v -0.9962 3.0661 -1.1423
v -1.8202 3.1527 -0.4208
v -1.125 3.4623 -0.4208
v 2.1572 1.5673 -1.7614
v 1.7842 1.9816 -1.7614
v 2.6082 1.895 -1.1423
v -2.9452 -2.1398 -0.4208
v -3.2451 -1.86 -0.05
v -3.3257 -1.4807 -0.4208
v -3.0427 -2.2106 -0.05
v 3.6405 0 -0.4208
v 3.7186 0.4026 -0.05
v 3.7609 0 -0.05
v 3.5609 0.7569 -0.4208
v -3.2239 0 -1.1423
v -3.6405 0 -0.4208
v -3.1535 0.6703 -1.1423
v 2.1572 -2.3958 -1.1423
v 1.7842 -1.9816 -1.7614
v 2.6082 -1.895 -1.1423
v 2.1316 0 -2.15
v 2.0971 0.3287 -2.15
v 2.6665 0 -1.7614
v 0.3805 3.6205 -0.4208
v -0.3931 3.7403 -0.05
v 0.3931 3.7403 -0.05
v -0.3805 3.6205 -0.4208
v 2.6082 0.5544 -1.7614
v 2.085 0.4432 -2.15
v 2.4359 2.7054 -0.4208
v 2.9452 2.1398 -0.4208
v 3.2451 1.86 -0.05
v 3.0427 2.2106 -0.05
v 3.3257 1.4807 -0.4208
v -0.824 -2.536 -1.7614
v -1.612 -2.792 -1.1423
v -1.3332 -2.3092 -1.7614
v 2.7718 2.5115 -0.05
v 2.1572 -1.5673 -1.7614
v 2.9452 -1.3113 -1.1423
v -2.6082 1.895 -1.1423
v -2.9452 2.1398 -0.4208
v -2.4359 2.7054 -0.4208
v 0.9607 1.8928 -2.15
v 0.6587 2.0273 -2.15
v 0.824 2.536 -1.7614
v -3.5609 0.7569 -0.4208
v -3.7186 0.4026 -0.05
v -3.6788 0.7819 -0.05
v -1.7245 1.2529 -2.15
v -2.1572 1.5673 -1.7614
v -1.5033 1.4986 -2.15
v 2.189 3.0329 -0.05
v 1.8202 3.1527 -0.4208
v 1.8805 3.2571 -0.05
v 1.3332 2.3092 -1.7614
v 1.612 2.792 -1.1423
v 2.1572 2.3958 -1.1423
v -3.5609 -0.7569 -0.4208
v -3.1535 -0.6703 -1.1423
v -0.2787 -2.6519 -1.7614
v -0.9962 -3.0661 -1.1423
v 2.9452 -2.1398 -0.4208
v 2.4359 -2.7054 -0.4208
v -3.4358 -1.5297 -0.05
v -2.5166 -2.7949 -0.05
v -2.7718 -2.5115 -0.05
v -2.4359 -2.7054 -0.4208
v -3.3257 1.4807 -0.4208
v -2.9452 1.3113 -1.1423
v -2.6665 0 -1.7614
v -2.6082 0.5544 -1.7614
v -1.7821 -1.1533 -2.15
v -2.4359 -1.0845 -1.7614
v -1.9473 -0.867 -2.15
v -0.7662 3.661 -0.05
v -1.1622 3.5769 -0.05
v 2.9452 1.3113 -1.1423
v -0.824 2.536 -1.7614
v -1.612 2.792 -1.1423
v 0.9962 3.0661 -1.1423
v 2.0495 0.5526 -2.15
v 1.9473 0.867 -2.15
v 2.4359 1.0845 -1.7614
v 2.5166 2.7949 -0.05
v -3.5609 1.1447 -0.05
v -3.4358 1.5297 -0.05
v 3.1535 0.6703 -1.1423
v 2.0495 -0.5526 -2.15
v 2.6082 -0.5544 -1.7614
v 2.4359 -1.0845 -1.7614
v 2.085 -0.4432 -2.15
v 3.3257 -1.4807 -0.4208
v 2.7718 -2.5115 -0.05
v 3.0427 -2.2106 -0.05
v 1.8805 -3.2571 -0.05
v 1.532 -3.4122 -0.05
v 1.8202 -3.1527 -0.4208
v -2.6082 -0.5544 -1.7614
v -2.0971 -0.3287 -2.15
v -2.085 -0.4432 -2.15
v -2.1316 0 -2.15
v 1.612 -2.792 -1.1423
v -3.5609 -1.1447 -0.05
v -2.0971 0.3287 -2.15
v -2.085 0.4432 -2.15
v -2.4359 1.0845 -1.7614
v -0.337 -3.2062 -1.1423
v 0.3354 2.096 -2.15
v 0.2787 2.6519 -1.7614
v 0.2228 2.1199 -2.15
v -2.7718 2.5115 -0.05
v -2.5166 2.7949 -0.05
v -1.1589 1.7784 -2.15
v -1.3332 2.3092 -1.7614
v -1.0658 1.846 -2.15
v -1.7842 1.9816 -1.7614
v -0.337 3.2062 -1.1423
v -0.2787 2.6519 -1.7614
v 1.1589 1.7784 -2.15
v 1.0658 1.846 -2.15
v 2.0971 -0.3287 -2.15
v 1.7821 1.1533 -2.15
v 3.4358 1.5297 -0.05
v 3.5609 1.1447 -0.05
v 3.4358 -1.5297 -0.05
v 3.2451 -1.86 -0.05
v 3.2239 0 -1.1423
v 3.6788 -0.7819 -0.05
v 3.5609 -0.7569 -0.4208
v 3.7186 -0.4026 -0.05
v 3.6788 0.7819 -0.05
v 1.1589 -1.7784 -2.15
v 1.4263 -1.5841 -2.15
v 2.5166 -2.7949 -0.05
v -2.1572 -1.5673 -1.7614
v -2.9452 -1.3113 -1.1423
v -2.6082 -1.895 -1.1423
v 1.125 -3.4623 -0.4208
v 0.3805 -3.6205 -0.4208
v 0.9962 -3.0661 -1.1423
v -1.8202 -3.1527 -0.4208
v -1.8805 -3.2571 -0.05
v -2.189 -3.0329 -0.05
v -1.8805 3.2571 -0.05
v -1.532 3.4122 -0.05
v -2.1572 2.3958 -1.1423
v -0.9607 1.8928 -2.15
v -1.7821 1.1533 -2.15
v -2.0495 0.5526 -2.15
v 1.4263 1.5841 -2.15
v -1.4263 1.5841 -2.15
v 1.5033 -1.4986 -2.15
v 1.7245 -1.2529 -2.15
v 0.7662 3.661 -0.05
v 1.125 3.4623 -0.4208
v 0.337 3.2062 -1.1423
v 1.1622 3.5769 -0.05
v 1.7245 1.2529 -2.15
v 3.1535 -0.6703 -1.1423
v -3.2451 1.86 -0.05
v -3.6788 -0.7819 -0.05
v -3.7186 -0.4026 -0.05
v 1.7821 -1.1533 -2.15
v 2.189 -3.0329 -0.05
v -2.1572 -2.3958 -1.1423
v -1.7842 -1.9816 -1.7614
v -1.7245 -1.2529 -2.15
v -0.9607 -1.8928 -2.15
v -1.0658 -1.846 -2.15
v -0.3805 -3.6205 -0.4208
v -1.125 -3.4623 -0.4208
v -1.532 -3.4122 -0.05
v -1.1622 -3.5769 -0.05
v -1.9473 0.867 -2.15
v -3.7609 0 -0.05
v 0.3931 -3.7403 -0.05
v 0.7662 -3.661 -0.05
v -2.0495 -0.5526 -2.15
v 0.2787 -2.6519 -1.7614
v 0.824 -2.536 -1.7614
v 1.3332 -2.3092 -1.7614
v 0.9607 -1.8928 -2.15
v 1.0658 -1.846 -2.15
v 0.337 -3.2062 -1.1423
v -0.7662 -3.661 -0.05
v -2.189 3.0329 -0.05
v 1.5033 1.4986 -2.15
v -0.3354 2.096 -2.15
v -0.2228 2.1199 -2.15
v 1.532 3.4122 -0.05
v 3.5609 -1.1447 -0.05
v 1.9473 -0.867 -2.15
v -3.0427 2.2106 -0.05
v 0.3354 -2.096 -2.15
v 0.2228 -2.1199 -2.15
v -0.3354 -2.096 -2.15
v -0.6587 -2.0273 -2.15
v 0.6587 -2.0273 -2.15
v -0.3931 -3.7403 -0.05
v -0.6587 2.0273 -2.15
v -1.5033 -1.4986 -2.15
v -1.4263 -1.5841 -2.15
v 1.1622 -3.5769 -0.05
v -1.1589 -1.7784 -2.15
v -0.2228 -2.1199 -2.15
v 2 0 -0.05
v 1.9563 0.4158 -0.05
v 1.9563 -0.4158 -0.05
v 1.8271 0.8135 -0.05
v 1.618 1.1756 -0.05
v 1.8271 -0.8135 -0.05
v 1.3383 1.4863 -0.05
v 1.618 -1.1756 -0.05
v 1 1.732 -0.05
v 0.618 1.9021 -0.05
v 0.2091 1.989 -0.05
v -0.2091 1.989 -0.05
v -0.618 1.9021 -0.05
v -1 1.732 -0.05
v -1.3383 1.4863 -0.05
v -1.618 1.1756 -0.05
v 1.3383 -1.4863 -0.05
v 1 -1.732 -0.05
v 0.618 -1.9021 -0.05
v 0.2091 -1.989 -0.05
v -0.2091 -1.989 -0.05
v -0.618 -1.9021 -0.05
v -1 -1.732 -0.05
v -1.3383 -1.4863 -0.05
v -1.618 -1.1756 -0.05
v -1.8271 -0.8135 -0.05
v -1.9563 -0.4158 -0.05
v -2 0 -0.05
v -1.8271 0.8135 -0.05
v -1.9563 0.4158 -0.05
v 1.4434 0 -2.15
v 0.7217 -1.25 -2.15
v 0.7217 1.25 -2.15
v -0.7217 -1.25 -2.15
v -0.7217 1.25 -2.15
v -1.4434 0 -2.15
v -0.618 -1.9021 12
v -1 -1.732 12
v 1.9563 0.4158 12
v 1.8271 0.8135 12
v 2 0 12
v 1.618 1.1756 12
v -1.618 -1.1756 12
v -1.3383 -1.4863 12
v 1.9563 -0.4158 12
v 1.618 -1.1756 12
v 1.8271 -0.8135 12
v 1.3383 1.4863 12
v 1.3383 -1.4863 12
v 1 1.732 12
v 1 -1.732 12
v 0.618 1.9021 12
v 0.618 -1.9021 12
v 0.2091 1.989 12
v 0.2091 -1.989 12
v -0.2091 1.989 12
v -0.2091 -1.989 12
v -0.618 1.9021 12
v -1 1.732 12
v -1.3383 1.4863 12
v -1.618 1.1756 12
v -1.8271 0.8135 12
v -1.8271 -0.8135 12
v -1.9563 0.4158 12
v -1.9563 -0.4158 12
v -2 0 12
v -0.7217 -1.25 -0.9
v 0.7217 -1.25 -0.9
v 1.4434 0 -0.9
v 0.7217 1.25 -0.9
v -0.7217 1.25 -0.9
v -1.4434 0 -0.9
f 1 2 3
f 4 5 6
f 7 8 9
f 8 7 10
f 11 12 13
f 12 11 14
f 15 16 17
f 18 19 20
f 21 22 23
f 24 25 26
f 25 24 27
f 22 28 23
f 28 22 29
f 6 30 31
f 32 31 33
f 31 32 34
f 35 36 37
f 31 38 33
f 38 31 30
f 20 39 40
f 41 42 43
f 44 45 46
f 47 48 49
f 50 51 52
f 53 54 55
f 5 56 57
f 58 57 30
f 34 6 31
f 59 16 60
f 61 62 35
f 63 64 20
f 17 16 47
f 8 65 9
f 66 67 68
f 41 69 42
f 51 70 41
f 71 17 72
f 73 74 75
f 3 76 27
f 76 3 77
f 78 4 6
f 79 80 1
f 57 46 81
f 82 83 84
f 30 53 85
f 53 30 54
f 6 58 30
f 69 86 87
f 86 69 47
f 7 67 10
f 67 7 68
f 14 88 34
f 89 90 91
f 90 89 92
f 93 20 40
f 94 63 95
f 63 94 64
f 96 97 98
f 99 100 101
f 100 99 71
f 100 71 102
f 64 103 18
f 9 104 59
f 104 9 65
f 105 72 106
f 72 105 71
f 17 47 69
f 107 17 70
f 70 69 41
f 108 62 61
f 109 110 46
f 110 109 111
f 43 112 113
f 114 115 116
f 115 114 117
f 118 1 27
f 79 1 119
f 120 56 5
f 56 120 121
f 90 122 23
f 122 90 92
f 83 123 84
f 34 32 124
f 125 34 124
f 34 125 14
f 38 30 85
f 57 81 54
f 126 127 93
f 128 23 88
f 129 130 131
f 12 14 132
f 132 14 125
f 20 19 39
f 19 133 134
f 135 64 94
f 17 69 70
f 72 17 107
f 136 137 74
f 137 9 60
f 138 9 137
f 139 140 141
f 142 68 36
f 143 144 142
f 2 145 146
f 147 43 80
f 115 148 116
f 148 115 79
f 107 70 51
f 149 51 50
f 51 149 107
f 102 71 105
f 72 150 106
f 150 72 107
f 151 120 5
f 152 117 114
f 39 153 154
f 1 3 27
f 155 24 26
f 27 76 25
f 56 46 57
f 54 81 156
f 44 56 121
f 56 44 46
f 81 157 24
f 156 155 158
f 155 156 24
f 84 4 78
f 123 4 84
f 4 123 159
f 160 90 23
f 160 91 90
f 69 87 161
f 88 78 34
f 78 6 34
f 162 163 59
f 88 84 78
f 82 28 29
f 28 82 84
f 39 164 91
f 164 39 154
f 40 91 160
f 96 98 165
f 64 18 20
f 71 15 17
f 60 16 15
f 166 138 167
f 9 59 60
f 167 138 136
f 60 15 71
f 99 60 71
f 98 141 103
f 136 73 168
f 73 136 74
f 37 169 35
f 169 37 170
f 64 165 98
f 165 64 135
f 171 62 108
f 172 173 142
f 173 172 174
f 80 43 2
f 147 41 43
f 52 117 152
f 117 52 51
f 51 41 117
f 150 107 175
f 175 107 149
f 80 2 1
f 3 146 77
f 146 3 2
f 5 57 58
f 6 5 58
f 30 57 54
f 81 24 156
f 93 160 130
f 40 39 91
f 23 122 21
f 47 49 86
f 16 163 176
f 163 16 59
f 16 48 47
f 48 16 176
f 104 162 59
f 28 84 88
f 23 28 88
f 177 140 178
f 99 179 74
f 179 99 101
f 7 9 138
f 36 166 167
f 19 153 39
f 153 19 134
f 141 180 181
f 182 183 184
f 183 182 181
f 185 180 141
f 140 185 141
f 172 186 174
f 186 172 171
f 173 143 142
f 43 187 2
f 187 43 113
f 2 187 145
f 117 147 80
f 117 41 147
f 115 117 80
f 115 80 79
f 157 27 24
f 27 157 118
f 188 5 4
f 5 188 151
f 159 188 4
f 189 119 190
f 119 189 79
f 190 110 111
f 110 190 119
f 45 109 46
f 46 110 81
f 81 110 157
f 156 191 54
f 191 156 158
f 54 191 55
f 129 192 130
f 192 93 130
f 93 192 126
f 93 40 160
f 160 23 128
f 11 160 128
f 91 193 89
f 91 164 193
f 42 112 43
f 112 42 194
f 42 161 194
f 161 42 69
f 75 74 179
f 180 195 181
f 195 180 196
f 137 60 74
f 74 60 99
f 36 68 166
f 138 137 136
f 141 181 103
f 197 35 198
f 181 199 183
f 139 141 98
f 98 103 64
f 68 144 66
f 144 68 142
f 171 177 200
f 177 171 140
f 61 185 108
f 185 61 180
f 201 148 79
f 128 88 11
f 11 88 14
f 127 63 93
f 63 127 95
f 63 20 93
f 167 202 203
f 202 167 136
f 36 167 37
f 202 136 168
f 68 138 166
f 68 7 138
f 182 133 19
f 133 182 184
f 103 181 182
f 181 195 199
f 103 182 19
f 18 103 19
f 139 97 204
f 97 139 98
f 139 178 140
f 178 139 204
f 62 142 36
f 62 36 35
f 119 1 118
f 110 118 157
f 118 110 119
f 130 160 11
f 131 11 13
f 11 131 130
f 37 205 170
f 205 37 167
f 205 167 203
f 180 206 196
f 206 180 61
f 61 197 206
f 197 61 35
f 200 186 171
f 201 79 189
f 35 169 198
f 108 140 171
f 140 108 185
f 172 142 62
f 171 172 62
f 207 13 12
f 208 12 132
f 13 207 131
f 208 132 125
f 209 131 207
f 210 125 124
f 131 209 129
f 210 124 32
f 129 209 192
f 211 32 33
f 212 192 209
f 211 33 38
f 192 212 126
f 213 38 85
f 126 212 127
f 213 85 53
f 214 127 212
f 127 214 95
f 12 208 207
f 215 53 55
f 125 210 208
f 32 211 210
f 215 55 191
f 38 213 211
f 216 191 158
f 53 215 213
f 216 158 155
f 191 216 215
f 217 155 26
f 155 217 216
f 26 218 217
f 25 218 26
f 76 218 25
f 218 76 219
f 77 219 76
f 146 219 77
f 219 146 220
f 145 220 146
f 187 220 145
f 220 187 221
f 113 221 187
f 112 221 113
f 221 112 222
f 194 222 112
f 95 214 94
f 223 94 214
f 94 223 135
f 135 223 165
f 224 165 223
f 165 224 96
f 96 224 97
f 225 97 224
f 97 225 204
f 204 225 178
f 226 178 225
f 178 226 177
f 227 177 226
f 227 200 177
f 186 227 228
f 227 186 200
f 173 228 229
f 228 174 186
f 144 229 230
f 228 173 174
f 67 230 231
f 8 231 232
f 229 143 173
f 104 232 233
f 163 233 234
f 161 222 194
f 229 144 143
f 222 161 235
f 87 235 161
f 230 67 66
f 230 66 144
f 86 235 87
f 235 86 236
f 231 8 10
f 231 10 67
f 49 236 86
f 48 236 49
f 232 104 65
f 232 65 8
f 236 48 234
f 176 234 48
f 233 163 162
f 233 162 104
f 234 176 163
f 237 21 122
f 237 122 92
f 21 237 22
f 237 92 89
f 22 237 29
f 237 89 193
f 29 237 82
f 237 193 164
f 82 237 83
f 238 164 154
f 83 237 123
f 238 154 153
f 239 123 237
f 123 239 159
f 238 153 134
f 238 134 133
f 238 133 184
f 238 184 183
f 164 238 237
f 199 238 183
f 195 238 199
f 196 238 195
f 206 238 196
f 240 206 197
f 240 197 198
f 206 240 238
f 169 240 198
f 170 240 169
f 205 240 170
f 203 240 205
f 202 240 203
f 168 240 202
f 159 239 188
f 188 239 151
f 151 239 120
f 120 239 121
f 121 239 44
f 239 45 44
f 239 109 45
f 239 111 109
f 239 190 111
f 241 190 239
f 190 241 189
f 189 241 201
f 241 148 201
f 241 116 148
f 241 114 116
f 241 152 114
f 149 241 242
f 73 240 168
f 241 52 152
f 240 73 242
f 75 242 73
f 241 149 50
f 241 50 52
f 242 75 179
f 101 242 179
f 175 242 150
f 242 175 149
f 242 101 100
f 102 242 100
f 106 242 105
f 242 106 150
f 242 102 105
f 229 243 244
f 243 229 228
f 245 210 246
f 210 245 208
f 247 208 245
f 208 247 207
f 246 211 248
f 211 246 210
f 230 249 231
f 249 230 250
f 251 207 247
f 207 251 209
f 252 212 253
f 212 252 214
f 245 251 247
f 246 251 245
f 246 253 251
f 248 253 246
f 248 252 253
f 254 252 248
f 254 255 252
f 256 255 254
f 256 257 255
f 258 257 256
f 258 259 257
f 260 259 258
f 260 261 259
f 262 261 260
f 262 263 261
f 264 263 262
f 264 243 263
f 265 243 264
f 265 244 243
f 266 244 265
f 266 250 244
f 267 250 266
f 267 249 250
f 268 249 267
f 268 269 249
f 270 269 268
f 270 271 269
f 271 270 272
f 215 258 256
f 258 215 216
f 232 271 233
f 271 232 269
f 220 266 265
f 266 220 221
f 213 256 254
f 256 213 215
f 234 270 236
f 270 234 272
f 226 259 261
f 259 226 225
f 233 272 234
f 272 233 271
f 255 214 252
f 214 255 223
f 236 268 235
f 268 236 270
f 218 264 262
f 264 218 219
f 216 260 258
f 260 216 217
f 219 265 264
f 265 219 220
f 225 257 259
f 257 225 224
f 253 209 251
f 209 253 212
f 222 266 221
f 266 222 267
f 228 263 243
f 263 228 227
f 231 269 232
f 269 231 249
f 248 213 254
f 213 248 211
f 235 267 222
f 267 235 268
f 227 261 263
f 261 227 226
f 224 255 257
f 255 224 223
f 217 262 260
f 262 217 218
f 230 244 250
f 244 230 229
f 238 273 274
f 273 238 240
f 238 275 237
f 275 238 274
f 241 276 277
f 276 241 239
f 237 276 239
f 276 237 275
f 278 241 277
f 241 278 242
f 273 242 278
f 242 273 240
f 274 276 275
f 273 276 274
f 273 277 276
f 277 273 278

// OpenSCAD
/*
   Copyright 2018 Scott Bezek and the splitflap contributors

   Licensed under the Apache License, Version 2.0 (the "License");
   you may not use this file except in compliance with the License.
   You may obtain a copy of the License at

       http://www.apache.org/licenses/LICENSE-2.0

   Unless required by applicable law or agreed to in writing, software
   distributed under the License is distributed on an "AS IS" BASIS,
   WITHOUT WARRANTIES OR CONDITIONS OF ANY KIND, either express or implied.
   See the License for the specific language governing permissions and
   limitations under the License.
*/

module roughM4_7380(length) {
    eps = 0.1;
    thread_diameter = 4;
    head_diameter = 7.6;
    head_length = 2.2;
    driving_depth = 1.3;
    driving_apothem = 2.5/2;
    driving_radius = driving_apothem / cos(180/6);

    sphere_offset = 1.2;  // Just a guess
    sphere_radius = sqrt(sphere_offset*sphere_offset + (head_diameter/2)*(head_diameter/2));


    difference() {
        union() {
            translate([0, 0, -eps]) {
                cylinder(h=length+eps, d=thread_diameter, $fn=30);
            }
            difference() {
                translate([0, 0, sphere_offset]) {
                    sphere(sphere_radius, $fn=30);
                }
                translate([0, 0, sphere_radius]) {
                    cube([sphere_radius*2 + eps, sphere_radius*2 + eps, sphere_radius*2 + eps], center=true);
                }
                translate([0, 0, -sphere_radius - head_length]) {
                    cube([sphere_radius*2 + eps, sphere_radius*2 + eps, sphere_radius*2 + eps], center=true);
                }
            }
        }
        translate([0, 0, -head_length-eps]) {
            cylinder(h=driving_depth+eps, r=driving_radius, $fn=6);
        }
    }
}

roughM4_7380(12);

        module color_selector(c) {
            precision = 0.0000001;  // arbitrary
            function compare_floats(x, y, i=0) = 
                  (len(x) != len(y)) ? false  // if arrays differ in length, they can't be equal
                : (i >= len(x)) ? true  // if we've hit the end of the arrays without issue, we're equal
                : (x[i] - precision <= y[i]) && x[i] + precision >= y[i]
                    ? compare_floats(x, y, i+1)
                    : false;  // not equal, short circuit

            if (c == [0, 0, 1] || compare_floats(c, [0, 0, 1]))
                children();
        }
                    
